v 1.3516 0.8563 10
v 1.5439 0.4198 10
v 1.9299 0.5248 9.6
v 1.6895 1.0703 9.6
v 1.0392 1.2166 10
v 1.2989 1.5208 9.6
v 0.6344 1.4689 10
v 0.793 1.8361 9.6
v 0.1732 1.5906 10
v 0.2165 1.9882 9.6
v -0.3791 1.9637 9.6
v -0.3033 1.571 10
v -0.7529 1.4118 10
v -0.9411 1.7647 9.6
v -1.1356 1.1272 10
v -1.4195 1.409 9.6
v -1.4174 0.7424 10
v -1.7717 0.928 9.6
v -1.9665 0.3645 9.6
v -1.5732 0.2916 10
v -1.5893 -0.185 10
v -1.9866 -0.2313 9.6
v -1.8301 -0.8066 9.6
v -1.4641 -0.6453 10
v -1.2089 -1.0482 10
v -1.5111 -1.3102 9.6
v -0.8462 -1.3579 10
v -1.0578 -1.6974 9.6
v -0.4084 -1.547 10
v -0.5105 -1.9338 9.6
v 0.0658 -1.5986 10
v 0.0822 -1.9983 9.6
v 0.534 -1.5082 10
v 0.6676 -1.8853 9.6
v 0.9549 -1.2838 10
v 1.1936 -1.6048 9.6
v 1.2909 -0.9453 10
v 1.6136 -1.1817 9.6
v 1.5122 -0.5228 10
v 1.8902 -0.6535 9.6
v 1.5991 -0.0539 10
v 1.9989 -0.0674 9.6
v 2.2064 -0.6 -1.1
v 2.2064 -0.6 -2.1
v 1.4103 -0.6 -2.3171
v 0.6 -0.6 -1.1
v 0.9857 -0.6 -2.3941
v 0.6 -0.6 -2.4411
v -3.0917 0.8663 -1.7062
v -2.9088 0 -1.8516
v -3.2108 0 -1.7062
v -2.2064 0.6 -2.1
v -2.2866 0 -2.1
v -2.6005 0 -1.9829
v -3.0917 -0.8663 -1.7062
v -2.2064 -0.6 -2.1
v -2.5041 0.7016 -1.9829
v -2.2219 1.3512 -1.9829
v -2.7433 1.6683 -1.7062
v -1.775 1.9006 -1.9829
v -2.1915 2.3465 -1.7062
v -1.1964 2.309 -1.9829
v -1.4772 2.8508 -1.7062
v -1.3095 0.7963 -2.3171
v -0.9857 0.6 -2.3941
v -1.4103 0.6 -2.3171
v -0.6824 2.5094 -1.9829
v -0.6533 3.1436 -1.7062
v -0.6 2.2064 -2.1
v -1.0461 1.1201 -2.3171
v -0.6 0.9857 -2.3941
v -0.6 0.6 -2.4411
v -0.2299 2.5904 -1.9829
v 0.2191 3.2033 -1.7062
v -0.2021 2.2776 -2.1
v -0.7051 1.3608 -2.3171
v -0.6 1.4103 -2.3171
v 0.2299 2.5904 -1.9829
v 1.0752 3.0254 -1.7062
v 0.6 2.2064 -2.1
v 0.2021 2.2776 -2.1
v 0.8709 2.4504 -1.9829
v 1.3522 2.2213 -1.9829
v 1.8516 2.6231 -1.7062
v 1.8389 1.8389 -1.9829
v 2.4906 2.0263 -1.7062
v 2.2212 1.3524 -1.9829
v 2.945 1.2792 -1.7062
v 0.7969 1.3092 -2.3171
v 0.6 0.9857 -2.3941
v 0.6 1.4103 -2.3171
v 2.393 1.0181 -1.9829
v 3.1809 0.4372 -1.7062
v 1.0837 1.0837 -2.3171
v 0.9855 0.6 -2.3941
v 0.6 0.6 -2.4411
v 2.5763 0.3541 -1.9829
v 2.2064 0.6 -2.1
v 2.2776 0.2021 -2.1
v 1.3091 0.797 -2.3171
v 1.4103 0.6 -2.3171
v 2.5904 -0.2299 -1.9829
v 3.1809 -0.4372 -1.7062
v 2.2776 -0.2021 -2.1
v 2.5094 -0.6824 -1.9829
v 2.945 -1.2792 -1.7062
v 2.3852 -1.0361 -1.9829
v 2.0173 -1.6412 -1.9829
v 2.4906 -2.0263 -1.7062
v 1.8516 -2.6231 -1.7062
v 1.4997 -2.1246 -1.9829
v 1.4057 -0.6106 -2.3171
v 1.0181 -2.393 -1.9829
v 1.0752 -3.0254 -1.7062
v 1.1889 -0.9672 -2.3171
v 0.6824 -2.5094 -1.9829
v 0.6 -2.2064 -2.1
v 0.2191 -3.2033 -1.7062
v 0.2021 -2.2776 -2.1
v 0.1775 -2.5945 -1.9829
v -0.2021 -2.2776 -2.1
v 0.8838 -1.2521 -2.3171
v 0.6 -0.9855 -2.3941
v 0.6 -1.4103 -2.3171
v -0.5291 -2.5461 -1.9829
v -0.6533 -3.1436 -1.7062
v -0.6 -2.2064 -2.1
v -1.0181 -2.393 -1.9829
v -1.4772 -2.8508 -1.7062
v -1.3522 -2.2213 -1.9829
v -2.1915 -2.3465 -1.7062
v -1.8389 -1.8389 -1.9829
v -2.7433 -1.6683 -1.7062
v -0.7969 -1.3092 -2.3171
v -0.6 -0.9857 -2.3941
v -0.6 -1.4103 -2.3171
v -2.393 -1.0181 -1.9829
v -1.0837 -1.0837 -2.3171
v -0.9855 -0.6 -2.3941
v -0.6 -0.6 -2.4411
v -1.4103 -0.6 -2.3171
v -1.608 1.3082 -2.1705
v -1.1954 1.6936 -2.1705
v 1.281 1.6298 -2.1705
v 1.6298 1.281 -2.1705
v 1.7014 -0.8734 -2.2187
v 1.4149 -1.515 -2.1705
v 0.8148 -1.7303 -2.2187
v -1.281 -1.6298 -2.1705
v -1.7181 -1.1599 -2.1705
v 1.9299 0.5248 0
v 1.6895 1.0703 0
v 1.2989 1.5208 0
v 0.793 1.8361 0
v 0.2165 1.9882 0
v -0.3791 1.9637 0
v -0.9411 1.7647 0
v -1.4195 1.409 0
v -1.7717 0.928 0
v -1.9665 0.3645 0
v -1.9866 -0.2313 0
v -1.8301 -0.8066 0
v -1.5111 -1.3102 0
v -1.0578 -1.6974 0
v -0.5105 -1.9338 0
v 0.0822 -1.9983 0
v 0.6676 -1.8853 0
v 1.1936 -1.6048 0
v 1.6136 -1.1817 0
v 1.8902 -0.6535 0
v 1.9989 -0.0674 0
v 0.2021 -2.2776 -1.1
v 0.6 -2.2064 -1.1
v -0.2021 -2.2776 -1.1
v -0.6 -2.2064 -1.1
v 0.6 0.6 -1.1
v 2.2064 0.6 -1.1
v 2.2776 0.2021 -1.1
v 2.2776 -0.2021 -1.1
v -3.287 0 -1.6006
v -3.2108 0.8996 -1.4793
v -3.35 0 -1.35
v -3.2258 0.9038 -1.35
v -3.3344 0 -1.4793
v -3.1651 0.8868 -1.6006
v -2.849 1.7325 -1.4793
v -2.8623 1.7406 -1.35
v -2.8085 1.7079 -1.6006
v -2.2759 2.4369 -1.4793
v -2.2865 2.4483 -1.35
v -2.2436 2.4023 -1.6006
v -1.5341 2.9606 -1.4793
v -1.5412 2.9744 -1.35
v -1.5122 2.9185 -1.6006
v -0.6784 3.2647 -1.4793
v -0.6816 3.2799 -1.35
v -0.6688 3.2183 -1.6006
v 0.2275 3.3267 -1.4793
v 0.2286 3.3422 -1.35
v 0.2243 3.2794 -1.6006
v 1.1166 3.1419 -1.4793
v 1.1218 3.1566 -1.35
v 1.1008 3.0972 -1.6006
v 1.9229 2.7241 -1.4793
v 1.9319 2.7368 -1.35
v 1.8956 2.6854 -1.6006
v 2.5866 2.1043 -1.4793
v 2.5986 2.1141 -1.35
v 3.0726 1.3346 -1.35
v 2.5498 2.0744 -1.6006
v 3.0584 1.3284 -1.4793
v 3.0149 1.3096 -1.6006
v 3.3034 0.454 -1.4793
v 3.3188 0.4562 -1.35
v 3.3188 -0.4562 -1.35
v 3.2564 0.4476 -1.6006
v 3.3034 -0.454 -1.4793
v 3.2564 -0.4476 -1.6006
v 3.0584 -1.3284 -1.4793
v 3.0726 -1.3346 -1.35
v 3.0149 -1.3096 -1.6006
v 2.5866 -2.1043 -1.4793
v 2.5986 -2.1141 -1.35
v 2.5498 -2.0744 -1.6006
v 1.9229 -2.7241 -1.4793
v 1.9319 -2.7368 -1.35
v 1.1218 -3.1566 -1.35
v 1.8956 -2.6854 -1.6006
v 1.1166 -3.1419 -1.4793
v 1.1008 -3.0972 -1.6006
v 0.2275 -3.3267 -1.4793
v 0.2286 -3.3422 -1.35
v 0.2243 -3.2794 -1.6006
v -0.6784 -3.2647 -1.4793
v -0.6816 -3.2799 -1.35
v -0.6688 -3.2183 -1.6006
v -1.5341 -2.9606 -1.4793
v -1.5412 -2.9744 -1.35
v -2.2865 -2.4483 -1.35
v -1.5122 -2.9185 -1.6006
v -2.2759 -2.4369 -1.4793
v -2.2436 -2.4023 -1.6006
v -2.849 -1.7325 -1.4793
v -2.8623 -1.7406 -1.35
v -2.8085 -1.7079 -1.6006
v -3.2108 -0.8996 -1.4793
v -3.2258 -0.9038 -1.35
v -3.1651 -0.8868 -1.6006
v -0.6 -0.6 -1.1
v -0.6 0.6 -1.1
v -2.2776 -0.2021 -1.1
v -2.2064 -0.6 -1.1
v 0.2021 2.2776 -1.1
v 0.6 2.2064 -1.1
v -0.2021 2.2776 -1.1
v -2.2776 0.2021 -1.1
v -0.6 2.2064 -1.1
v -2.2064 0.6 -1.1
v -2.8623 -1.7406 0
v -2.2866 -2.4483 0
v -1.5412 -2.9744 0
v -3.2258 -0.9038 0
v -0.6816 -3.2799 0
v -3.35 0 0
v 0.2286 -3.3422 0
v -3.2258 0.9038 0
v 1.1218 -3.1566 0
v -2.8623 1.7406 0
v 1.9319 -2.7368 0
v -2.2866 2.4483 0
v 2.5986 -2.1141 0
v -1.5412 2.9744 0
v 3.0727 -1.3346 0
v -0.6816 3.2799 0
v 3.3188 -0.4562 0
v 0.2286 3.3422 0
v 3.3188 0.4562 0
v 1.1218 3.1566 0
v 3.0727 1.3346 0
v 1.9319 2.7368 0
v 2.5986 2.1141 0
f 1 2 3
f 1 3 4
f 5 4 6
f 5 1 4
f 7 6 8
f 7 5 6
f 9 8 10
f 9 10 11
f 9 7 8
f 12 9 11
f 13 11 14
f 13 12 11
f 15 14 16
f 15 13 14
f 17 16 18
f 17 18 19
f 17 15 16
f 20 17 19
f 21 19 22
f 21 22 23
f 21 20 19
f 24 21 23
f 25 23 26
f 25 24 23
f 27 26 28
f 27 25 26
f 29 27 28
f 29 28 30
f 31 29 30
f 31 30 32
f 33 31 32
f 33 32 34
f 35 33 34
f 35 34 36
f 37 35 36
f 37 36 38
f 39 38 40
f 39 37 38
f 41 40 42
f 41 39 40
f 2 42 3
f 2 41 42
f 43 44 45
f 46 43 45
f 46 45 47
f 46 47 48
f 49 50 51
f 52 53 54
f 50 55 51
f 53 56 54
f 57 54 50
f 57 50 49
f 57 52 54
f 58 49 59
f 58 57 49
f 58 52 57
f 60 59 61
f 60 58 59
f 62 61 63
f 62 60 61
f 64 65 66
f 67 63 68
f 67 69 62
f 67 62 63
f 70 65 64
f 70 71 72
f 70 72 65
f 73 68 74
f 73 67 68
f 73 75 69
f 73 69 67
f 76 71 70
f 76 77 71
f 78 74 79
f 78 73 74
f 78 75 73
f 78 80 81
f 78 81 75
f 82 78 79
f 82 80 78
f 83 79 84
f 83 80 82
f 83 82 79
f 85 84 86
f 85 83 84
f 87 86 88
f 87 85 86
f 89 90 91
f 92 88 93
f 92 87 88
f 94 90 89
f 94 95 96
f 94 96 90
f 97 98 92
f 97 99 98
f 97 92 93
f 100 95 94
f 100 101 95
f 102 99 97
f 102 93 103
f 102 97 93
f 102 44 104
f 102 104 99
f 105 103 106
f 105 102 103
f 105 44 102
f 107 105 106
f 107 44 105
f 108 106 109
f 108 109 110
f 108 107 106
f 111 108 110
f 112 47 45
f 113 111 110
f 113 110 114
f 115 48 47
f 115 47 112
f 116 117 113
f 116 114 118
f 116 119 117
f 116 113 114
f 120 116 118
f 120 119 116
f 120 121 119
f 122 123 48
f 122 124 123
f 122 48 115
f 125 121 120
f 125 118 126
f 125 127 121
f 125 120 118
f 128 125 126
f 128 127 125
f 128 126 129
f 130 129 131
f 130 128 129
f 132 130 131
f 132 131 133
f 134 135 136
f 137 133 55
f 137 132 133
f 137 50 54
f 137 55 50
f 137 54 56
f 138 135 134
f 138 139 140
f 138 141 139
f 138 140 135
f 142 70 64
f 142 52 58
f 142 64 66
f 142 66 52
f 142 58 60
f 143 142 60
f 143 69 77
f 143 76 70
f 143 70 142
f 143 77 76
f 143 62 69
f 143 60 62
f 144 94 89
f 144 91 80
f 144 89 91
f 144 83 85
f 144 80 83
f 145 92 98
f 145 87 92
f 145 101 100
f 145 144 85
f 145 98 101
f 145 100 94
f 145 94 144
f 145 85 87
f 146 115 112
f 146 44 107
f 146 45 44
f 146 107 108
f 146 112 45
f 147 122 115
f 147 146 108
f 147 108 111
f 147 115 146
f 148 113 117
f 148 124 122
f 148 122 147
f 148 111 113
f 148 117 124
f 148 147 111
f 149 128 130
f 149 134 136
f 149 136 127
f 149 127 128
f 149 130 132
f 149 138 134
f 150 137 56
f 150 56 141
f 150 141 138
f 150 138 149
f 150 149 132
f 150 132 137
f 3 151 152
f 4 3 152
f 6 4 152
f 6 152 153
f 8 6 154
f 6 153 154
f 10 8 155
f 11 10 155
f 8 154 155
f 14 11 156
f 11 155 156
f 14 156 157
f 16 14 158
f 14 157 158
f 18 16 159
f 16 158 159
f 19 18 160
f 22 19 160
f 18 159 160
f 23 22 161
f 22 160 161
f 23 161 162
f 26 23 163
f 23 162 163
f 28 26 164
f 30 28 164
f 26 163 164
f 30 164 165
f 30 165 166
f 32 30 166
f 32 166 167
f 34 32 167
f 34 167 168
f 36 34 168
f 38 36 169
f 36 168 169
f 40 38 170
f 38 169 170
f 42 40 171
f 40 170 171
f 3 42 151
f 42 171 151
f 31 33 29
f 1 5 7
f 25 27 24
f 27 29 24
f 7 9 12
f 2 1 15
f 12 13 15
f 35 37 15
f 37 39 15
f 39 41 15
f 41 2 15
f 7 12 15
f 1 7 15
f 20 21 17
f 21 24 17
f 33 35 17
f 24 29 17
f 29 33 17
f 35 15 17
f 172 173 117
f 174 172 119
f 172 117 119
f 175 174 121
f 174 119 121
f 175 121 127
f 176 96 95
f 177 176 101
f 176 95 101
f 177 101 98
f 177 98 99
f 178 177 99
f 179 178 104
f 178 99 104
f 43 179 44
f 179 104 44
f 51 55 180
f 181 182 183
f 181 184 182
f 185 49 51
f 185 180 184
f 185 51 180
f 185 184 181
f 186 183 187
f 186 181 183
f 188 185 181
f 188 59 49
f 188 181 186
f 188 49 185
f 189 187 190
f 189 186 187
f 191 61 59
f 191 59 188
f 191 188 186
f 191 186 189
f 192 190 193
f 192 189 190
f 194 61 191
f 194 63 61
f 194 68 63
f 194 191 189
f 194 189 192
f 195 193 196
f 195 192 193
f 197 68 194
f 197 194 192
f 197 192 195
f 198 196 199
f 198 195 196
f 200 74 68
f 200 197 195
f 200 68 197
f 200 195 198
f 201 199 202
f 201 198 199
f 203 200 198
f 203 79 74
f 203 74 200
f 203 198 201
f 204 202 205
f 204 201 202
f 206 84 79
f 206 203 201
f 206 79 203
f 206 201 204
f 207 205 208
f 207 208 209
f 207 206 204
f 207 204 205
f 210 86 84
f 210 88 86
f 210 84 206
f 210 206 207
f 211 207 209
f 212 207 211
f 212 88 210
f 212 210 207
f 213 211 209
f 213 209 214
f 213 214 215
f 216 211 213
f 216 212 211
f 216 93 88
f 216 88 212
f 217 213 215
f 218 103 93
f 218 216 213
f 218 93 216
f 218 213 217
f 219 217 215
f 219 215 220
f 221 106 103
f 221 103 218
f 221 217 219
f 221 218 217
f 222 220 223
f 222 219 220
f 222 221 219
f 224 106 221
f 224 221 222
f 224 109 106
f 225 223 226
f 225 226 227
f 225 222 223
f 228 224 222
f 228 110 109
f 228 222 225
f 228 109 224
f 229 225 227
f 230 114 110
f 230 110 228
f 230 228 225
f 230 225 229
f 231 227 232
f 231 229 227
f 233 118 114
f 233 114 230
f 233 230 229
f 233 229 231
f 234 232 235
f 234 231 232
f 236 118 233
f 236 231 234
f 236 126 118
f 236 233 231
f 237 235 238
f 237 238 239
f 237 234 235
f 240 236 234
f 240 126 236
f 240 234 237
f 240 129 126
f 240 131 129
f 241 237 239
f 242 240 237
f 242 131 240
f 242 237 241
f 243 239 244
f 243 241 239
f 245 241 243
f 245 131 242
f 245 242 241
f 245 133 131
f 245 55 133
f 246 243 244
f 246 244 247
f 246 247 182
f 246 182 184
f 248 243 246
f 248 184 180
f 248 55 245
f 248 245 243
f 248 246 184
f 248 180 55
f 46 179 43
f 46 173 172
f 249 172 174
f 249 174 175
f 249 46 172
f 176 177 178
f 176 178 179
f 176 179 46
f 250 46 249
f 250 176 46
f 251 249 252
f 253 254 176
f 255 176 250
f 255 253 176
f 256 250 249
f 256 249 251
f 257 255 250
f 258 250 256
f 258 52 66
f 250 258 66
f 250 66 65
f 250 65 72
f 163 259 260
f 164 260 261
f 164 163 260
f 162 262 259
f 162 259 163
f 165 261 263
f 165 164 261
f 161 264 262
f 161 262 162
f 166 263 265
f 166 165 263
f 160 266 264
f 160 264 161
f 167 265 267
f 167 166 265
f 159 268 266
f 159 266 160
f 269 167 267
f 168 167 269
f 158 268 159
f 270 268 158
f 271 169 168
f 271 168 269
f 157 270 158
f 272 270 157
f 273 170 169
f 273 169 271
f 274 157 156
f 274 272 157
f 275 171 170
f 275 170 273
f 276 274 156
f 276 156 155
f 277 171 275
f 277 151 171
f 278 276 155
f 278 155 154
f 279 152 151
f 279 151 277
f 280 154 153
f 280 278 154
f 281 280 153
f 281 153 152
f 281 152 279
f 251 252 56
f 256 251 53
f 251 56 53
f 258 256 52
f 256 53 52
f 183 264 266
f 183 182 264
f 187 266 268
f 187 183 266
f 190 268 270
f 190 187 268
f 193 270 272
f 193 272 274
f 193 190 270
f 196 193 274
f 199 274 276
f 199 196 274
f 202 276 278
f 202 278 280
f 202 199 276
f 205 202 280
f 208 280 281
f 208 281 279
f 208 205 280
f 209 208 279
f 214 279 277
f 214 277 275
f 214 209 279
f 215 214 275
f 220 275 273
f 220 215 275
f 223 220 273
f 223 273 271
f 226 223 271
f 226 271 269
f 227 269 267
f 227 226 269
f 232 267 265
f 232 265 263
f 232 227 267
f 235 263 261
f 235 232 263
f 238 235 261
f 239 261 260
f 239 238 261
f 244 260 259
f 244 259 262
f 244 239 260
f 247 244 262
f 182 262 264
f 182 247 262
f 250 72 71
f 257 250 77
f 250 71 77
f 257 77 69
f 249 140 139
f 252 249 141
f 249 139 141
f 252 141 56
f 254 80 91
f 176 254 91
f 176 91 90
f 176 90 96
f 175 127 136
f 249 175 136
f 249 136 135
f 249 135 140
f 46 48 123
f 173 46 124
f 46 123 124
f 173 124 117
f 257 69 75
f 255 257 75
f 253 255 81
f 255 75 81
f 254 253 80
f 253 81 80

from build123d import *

# Parameters (mm, degrees)
ENLEV_MAT_EXTRU_1_DEPTH = 1
ESQUISSE3_W             = 2
ESQUISSE3_H             = 10
CHANFREIN1_SIZE         = 0.4
ENL_V_MAT_EXTRU_1_DEPTH = 1


with BuildPart() as part:
    # Esquisse1 → Base-Révolution (revolve)
    with BuildSketch(Plane(origin=(0, 0, 0), x_dir=(1, 0, 0), z_dir=(0, 1, 0))):
        with BuildLine():
            Line((0, 0), (3.35, 0))
            Line((3.35, 0), (3.349988656, 1.349988656))
            ThreePointArc((3.349988656, 1.349988656), (3.314559619, 1.541470155), (3.210770724, 1.706237405))
            ThreePointArc((3.210770724, 1.706237405), (1.651042147, 2.288775714), (0, 2.503633679))
            Line((0, 2.503633679), (0, 0))
        make_face()
    revolve(axis=Axis((0, 0, 0), (0, 0, -1)))

    # Esquisse2 → Enlev. mat.-Extru.1 (cut)
    with BuildSketch(Plane.XY.offset(-3.1)):
        Polygon((0.6, -0.6), (0.6, -2.35), (-0.6, -2.35), (-0.6, -0.6), (-2.35, -0.6), (-2.35, 0.6), (-0.6, 0.6), (-0.6, 2.35), (0.6, 2.35), (0.6, 0.6), (2.35, 0.6), (2.35, -0.6), align=None)
    extrude(amount=ENLEV_MAT_EXTRU_1_DEPTH, mode=Mode.SUBTRACT)

    # Esquisse3 → Boss.-Révol.1 (revolve)
    with BuildSketch(Plane(origin=(0, 0, 0), x_dir=(1, 0, 0), z_dir=(0, 1, 0))):
        with Locations((1, -5)):
            Rectangle(ESQUISSE3_W, ESQUISSE3_H)
    revolve(axis=Axis((0, 0, 0), (0, 0, 1)))

    # Chanfrein1
    chanfrein1_edges = [part.edges().sort_by_distance(p)[0] for p in [
        (-2, 0, 10),
    ]]
    chamfer(chanfrein1_edges, length=CHANFREIN1_SIZE)

    # Esquisse6 → Enlèv. mat.-Extru.1 (cut)
    with BuildSketch(Plane(origin=(0, 0, -2.1), x_dir=(-1, 0, 0), z_dir=(0, 0, -1))):
        with BuildLine():
            Line((2.206431589, 0.6), (0.6, 0.6))
            Line((0.6, 0.6), (0.6, 2.206431589))
            ThreePointArc((0.6, 2.206431589), (0, 2.286556441), (-0.6, 2.206431589))
            Line((-0.6, 2.206431589), (-0.6, 0.6))
            Line((-0.6, 0.6), (-2.206431589, 0.6))
            ThreePointArc((-2.206431589, 0.6), (-2.286556441, 0), (-2.206431589, -0.6))
            Line((-2.206431589, -0.6), (-0.6, -0.6))
            Line((-0.6, -0.6), (-0.6, -2.206431589))
            ThreePointArc((-0.6, -2.206431589), (0, -2.286556441), (0.6, -2.206431589))
            Line((0.6, -2.206431589), (0.6, -0.6))
            Line((0.6, -0.6), (2.206431589, -0.6))
            ThreePointArc((2.206431589, -0.6), (2.286556441, 0), (2.206431589, 0.6))
        make_face()
    extrude(amount=-ENL_V_MAT_EXTRU_1_DEPTH, mode=Mode.SUBTRACT)


solid = part.part
